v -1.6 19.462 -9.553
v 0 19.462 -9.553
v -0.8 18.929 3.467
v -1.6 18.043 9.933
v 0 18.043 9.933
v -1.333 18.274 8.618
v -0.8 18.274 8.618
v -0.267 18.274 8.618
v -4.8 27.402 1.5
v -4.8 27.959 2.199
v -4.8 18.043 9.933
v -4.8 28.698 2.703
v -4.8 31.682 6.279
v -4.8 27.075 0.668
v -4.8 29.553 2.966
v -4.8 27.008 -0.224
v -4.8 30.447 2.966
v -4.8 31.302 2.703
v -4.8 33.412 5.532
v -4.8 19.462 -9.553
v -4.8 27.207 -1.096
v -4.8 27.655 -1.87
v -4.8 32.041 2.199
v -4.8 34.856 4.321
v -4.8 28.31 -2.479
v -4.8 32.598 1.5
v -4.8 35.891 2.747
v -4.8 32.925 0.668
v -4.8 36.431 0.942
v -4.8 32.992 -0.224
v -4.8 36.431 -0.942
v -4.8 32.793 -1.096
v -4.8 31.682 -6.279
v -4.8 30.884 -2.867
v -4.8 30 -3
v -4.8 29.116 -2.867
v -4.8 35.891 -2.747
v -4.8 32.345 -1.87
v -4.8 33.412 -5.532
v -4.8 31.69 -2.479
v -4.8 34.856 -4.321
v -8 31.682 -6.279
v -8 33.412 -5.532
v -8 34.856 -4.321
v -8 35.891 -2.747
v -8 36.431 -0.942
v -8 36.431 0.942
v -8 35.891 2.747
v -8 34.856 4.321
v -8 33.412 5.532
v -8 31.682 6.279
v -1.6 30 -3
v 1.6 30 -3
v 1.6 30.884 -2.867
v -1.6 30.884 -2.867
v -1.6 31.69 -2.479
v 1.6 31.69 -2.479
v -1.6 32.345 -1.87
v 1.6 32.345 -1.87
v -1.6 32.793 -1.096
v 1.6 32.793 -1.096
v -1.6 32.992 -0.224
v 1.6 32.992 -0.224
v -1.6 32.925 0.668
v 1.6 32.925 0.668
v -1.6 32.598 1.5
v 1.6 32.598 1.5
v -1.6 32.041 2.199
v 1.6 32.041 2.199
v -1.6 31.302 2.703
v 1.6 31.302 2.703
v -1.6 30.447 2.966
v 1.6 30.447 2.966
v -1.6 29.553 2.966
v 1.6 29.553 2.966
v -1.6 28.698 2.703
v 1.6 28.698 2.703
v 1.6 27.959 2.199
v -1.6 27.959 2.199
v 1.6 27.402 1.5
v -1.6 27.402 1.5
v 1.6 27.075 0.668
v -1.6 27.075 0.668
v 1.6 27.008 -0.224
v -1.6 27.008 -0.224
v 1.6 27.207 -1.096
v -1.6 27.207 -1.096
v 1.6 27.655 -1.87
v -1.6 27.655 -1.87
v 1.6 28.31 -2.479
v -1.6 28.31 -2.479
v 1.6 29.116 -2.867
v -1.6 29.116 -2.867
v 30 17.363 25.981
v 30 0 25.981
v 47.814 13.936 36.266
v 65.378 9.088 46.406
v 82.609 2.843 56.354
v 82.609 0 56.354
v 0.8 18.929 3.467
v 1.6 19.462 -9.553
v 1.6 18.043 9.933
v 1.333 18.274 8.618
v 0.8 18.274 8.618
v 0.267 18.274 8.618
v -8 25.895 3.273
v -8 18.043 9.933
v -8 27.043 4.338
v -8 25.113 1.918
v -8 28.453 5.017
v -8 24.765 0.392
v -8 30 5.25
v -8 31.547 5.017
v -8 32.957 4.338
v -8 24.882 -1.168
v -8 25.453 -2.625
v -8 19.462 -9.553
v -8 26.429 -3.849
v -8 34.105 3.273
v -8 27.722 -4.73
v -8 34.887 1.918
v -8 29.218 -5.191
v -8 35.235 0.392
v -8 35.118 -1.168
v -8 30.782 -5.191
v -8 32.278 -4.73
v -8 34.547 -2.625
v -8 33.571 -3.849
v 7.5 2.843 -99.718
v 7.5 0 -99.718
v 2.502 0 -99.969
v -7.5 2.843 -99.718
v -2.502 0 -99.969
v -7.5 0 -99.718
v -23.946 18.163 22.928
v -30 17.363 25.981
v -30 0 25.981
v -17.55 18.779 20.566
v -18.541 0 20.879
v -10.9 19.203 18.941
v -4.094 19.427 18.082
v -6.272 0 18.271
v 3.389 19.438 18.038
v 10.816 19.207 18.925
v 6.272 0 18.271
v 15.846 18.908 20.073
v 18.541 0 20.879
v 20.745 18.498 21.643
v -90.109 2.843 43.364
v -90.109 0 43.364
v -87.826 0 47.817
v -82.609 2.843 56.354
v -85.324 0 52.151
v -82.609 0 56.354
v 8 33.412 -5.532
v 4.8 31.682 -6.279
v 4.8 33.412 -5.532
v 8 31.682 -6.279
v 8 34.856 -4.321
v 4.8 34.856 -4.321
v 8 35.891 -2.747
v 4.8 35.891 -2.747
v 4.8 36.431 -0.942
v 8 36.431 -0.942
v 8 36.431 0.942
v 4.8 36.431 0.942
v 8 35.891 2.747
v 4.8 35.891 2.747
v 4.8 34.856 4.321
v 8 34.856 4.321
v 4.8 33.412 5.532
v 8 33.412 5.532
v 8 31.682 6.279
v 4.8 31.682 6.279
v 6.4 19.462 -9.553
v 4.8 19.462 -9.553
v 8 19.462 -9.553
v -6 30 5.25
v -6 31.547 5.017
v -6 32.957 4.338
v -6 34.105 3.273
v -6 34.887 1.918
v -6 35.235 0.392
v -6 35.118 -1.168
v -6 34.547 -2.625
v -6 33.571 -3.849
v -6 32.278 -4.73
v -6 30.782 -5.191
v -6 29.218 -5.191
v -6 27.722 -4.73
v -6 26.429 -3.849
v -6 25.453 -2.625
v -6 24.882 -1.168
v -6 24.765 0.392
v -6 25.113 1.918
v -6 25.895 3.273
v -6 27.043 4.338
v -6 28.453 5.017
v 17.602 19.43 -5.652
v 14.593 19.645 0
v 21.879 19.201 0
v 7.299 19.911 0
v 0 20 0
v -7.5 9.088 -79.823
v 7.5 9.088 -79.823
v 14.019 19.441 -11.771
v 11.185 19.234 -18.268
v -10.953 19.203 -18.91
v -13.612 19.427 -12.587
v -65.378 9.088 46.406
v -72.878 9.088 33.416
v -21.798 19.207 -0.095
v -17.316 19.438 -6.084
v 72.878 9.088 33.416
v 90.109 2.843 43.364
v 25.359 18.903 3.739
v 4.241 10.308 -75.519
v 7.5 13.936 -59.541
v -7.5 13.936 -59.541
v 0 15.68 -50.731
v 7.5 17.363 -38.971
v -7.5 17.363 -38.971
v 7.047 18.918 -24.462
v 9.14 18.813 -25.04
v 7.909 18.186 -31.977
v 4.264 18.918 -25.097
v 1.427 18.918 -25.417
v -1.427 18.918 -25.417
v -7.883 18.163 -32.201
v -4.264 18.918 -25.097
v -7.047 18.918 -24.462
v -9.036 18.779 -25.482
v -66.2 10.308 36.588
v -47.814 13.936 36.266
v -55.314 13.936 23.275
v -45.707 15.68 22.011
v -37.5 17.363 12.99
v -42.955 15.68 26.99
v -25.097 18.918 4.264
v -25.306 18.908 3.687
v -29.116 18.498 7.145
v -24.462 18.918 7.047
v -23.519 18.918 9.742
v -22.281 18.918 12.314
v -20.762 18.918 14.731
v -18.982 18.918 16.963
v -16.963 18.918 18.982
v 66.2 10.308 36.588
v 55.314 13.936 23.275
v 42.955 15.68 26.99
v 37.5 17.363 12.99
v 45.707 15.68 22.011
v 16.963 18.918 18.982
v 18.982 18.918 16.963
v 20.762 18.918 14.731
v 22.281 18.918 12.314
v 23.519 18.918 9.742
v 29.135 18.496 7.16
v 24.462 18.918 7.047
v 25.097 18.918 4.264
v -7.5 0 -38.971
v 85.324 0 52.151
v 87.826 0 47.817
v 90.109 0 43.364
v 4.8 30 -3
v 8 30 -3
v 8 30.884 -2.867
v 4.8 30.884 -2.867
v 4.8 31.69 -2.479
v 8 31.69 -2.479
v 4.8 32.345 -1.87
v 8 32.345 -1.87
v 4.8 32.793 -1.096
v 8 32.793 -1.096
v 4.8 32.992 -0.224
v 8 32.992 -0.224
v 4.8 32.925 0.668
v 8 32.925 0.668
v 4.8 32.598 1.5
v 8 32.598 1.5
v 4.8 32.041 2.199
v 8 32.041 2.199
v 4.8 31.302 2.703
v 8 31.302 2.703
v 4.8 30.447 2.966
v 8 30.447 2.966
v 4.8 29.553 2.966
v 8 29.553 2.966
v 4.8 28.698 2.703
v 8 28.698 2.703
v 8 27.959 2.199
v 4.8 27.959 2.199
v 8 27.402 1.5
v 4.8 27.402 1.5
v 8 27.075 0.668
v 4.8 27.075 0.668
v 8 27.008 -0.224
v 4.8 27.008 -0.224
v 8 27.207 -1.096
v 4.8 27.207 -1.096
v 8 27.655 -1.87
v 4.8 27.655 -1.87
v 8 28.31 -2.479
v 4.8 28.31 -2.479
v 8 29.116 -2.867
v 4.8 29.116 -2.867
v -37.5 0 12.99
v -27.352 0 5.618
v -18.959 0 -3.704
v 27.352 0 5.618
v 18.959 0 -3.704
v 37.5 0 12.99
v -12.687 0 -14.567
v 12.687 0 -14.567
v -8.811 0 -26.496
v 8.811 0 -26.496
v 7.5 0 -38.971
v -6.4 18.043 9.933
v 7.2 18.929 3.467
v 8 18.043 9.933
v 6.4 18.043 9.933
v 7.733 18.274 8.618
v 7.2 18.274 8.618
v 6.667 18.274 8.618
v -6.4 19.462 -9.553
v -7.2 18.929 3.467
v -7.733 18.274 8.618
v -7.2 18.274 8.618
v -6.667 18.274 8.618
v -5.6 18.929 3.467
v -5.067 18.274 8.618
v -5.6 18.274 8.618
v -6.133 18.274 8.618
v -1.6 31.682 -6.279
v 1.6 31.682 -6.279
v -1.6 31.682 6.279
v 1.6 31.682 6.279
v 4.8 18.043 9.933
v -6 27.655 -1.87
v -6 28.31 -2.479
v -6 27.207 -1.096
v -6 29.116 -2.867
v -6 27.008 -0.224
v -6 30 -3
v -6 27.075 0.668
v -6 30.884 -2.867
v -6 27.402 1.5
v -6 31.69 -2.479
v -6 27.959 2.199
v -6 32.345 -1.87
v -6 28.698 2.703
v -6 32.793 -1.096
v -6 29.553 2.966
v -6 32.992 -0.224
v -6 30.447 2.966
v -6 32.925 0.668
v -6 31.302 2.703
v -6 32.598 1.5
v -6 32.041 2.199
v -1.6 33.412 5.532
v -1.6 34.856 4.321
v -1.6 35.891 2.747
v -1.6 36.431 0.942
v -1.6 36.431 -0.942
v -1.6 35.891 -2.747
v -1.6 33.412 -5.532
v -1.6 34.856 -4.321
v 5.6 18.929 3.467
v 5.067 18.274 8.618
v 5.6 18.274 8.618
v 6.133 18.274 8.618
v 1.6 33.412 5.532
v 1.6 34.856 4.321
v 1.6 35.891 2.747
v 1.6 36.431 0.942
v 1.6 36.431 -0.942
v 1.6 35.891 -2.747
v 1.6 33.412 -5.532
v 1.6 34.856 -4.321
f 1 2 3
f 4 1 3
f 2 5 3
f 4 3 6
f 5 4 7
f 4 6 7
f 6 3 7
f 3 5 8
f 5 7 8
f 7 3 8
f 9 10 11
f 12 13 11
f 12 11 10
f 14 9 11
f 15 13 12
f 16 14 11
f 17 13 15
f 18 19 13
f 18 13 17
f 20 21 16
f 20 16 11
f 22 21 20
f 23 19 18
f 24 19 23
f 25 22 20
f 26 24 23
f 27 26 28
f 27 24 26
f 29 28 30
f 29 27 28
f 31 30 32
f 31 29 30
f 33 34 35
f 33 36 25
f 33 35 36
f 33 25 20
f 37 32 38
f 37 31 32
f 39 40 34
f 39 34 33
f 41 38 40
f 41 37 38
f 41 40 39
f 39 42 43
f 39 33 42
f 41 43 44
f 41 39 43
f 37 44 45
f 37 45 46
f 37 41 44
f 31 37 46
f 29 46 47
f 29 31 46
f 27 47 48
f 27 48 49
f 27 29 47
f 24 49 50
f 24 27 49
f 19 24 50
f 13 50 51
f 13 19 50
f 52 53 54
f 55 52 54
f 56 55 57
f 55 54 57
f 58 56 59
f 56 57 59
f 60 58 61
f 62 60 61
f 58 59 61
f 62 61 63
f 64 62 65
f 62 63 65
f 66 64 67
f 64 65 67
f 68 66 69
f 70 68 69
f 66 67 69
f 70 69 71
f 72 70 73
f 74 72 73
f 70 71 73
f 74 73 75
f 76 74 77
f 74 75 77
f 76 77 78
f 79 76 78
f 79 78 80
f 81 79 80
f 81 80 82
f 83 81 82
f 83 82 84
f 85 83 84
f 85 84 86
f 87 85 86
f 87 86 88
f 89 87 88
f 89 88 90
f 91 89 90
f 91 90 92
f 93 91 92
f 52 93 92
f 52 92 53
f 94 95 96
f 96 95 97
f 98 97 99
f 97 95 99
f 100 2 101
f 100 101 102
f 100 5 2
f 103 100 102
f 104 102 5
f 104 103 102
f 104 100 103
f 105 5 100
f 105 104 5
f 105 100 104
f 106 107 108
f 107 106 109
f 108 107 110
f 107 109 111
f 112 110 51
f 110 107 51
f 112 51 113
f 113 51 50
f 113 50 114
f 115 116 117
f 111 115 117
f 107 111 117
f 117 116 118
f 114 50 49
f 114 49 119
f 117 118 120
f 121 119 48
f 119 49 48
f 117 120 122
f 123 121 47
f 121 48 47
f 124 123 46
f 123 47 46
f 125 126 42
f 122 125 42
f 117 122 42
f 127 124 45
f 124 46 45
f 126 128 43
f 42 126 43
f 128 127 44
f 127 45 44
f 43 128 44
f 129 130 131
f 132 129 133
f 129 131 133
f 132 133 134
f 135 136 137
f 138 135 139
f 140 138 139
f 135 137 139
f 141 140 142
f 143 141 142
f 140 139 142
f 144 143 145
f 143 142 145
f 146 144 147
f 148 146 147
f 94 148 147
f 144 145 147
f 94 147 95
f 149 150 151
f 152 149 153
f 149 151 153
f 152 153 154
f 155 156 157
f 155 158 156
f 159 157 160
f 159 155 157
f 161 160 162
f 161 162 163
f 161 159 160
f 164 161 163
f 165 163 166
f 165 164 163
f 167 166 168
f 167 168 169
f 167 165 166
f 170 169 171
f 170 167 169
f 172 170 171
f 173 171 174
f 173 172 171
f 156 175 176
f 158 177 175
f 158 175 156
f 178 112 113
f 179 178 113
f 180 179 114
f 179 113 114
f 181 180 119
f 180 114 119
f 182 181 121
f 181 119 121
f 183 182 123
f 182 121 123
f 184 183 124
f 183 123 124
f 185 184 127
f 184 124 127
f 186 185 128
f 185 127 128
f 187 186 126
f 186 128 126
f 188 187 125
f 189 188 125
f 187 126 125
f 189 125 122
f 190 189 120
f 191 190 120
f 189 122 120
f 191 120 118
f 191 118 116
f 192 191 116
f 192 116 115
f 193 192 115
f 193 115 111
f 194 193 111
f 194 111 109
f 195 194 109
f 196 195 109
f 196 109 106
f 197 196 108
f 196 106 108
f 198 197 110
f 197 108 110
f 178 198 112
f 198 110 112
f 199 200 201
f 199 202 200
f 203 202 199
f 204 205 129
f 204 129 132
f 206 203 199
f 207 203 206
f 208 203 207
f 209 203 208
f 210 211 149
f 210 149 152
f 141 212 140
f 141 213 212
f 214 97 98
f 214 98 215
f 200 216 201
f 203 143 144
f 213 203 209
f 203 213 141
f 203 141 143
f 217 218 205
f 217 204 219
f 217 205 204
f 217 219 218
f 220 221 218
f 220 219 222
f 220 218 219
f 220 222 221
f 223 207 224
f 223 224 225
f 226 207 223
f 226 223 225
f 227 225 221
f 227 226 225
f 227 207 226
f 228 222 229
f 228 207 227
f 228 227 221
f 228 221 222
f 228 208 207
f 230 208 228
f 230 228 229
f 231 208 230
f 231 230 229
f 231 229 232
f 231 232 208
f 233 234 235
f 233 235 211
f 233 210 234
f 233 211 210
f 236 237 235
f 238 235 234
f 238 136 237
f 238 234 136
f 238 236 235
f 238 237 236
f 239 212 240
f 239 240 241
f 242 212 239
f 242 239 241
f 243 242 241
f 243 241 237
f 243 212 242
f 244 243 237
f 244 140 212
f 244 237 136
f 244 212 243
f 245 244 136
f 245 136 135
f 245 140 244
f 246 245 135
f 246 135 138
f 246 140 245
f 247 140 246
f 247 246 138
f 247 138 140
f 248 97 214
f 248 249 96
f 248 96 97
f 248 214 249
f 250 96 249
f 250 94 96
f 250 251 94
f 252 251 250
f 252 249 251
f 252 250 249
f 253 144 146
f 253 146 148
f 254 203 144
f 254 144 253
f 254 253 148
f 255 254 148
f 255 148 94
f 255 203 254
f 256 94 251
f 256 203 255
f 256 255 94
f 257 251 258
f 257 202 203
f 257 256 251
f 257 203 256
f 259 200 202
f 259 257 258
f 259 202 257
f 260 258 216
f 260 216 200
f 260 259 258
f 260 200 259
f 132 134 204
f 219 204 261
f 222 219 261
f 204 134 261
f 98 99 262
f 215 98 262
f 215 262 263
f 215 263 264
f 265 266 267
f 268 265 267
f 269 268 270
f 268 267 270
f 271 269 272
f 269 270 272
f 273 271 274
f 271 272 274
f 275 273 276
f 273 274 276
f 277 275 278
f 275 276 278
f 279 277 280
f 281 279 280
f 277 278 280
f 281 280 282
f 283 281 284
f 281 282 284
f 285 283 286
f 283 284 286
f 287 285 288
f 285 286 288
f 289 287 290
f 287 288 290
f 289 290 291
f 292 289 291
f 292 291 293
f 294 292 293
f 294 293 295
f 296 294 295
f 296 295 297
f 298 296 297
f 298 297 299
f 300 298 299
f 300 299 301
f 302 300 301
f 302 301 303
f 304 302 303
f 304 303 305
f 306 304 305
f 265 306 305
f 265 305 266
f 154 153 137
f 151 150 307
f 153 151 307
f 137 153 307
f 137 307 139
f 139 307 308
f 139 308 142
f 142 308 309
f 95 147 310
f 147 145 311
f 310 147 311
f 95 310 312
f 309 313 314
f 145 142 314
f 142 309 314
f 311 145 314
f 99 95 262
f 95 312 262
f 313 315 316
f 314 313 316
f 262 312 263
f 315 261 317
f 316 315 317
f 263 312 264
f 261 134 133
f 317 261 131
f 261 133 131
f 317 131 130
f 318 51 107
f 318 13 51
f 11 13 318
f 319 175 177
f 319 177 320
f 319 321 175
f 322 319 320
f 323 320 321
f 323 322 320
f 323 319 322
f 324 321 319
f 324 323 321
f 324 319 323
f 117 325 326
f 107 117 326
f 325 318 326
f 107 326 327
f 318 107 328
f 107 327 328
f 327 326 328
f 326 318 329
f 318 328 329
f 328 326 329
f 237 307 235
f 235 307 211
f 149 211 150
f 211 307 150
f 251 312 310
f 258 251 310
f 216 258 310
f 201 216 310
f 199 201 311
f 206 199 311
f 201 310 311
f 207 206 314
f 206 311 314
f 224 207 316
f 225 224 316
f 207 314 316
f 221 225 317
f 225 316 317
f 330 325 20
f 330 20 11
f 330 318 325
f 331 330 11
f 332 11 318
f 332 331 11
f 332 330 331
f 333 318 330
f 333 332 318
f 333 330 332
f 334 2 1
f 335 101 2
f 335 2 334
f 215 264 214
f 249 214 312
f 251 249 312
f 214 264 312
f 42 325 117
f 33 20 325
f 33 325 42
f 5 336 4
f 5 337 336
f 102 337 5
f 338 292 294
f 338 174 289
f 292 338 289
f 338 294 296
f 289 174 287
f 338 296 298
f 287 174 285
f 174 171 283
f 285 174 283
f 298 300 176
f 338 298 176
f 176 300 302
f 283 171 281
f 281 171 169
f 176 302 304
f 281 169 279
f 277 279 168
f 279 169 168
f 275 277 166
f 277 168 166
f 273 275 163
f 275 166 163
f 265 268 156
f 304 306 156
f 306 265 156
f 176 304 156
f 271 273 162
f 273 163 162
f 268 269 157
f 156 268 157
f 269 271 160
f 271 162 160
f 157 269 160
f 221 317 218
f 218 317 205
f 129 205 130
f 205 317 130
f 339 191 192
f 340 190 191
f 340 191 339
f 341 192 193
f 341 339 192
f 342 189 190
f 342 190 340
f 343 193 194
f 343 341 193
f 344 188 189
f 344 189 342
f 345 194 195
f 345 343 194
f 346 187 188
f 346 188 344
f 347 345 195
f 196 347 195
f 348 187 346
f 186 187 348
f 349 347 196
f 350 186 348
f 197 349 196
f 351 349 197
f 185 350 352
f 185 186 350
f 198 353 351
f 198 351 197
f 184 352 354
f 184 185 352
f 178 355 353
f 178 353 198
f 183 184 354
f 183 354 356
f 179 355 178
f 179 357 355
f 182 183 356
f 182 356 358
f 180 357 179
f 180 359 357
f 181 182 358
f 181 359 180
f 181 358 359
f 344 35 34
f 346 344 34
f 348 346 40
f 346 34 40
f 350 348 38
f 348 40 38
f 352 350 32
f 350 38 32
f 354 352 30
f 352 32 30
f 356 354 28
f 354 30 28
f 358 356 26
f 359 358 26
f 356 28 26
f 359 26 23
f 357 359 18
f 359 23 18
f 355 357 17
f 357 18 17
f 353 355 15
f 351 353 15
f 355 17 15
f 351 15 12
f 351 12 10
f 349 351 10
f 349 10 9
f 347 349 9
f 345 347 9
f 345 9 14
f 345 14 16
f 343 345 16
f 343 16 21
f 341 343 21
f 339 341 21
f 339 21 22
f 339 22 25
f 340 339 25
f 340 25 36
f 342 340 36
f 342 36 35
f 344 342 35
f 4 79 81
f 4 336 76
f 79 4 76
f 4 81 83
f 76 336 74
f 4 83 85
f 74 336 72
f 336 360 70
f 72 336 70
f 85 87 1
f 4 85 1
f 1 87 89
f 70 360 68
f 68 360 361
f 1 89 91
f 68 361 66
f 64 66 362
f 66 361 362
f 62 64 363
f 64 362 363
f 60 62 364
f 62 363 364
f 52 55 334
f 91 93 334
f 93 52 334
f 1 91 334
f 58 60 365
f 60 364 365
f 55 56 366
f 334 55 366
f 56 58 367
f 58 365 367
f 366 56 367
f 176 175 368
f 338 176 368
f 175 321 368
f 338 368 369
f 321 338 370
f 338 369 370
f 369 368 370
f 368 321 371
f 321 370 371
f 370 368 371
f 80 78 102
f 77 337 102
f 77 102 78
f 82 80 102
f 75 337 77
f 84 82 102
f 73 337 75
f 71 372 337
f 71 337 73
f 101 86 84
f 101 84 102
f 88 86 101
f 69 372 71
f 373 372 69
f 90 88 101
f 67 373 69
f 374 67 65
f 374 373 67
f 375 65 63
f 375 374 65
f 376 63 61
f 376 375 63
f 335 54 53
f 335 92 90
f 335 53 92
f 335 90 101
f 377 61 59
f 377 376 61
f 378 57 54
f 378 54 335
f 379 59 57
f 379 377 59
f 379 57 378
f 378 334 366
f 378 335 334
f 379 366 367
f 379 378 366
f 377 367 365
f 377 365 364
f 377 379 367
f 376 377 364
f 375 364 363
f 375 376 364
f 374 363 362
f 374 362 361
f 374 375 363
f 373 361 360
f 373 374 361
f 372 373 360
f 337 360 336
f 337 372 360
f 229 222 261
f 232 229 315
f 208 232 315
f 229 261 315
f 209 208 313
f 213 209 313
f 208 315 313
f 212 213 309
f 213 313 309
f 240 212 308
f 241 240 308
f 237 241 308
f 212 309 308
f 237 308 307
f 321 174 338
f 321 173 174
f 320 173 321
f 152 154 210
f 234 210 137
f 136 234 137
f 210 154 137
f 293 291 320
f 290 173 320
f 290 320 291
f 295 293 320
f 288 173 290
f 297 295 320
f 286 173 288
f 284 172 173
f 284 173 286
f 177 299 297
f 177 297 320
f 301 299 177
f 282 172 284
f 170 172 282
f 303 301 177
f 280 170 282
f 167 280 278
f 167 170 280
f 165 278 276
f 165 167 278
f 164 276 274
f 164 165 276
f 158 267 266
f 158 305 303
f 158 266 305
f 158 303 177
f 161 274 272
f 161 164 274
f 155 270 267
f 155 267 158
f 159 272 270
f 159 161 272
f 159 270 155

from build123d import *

# Parameters (mm, degrees)
BOSS_EXTRUDE1_DEPTH = 20
BOSS_EXTRUDE2_DEPTH = 1.6
SKETCH5_R           = 3
CUT_EXTRUDE1_DEPTH  = 145.767236586
SKETCH6_R           = 5.25
CUT_EXTRUDE2_DEPTH  = 2


with BuildPart() as part:
    # Sketch1 → Boss-Extrude1 (new body)
    with BuildSketch(Plane(origin=(0, 0, 0), x_dir=(1, 0, 0), z_dir=(0, 1, 0))):
        with BuildLine():
            Line((-7.5, 99.718353376), (-7.5, 38.97114317))
            ThreePointArc((-7.5, 38.97114317), (-15.538475773, 8.97114317), (-37.5, -12.990381057))
            Line((-37.5, -12.990381057), (-90.108627247, -43.36398616))
            ThreePointArc((-90.108627247, -43.36398616), (-86.602540378, -50), (-82.608627247, -56.354367216))
            Line((-82.608627247, -56.354367216), (-30, -25.980762114))
            ThreePointArc((-30, -25.980762114), (0, -17.942286341), (30, -25.980762114))
            Line((30, -25.980762114), (82.608627247, -56.354367216))
            ThreePointArc((82.608627247, -56.354367216), (86.602540035, -50.000000595), (90.108626651, -43.363987398))
            Line((90.108626651, -43.363987398), (37.5, -12.99038264))
            ThreePointArc((37.5, -12.99038264), (15.538475773, 8.971141587), (7.5, 38.971141587))
            Line((7.5, 38.971141587), (7.5, 99.718353376))
            ThreePointArc((7.5, 99.718353376), (0, 100), (-7.5, 99.718353376))
        make_face()
    extrude(amount=BOSS_EXTRUDE1_DEPTH)

    # Sketch2 → Cut-Revolve4 (revolve, cut)
    with BuildSketch(Plane.XY):
        with BuildLine():
            Line((0, 20), (0, 34.954541697))
            Line((0, 34.954541697), (120, 34.954541697))
            Line((120, 34.954541697), (120, -5.045458303))
            ThreePointArc((120, -5.045458303), (61.292893107, 13.671893879), (0, 20))
        make_face()
    revolve(axis=Axis((0, 0, 0), (0, 1, 0)), mode=Mode.SUBTRACT)


with BuildPart() as body_2:
    # Sketch4 → Boss-Extrude2 (new, symmetric)
    with BuildSketch(Plane(origin=(0, 0, 0), x_dir=(0, 0, -1), z_dir=(1, 0, 0))):
        with BuildLine():
            Line((-6.278517871, 31.682323793), (-9.933210146, 18.042826538))
            add(Edge.make_bspline(
                [(9.55294178, 19.4620074), (9.366408214, 19.462627062), (6.910672995, 19.466883672), (4.548636298, 19.419395978), (1.398759391, 19.284530963), (0.380021767, 19.228451245), (-1.591242497, 19.094905023), (-2.544701819, 19.017397796), (-5.310174504, 18.753138299), (-7.02767955, 18.53478756), (-9.066841454, 18.200216125), (-9.505139098, 18.123246137), (-9.933210146, 18.042826538)],
                knots=[0.489756792, 0.489756792, 0.489756792, 0.489756792, 0.5, 0.625, 0.625, 0.6875, 0.6875, 0.75, 0.75, 0.875, 0.875, 0.910234617, 0.910234617, 0.910234617, 0.910234617], degree=3))
            Line((9.55294178, 19.4620074), (6.278517871, 31.682323793))
            ThreePointArc((6.278517871, 31.682323793), (0, 36.5), (-6.278517871, 31.682323793))
        make_face()
    extrude(amount=BOSS_EXTRUDE2_DEPTH, both=True)


with BuildPart() as body_3:
    # Body-Move/Copy2: copy of body 2
    add(body_2.part.moved(Location((6.4, 0, 0))))


with BuildPart() as body_4:
    # Body-Move/Copy3: copy of body 2
    add(body_2.part.moved(Location((-6.4, 0, 0))))


with BuildPart() as cut_extrude1_tool:
    # Sketch5 → Cut-Extrude1 (new, through all)
    with BuildSketch(Plane(origin=(8, 0, 0), x_dir=(0, 0, -1), z_dir=(1, 0, 0))):
        with Locations((0, 30)):
            Circle(SKETCH5_R)
    extrude(amount=-CUT_EXTRUDE1_DEPTH)


with BuildPart() as body_2_1:
    add(body_2.part)

    # Cut-Extrude1: cut by cut_extrude1_tool
    add(cut_extrude1_tool.part, mode=Mode.SUBTRACT)


with BuildPart() as body_3_1:
    add(body_3.part)

    # Cut-Extrude1: cut by cut_extrude1_tool
    add(cut_extrude1_tool.part, mode=Mode.SUBTRACT)


with BuildPart() as body_4_1:
    add(body_4.part)

    # Cut-Extrude1: cut by cut_extrude1_tool
    add(cut_extrude1_tool.part, mode=Mode.SUBTRACT)

    # Sketch6 → Cut-Extrude2 (cut)
    with BuildSketch(Plane.ZY.offset(8)):
        with Locations((0, 30)):
            Circle(SKETCH6_R)
    extrude(amount=-CUT_EXTRUDE2_DEPTH, mode=Mode.SUBTRACT)


solid = Compound([part.part, body_2_1.part, body_3_1.part, body_4_1.part])
